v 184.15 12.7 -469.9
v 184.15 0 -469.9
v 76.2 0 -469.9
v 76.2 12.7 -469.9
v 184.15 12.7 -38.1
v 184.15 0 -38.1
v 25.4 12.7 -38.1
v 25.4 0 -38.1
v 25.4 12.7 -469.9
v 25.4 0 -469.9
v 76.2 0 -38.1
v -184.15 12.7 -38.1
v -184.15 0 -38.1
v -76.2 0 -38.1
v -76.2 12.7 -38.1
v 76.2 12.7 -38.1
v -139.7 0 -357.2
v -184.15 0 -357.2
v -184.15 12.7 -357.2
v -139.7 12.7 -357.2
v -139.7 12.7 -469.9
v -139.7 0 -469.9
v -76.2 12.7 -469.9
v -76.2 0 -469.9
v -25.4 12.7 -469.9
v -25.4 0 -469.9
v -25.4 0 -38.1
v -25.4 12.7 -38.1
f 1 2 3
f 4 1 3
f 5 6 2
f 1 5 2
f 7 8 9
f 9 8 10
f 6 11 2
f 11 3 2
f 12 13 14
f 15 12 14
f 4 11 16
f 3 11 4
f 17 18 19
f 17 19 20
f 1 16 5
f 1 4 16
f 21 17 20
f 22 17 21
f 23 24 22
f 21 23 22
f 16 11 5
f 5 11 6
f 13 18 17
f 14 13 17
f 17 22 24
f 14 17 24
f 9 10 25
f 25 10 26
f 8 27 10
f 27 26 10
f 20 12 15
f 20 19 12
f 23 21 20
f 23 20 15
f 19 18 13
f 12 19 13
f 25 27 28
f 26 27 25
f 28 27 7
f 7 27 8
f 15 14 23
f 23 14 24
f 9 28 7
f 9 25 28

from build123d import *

# Parameters (mm, degrees)
EXTRUDE2_DEPTH          = 12.7
SKETCH3_W               = 463.121935294
SKETCH3_H               = 86.735895098
CUT_EXTRUDE1_DEPTH      = 505.854951942
CUT_EXTRUDE2_DEPTH      = 505.854951942
SKETCH5_W               = 50.8
SKETCH5_H               = 476.704079848
CUT_EXTRUDE3_DEPTH      = 505.854951942
CUT_EXTRUDE4_DEPTH      = 505.854951942
CUT_EXTRUDE4_DEPTH_BACK = 505.854951942


with BuildPart() as part:
    # Sketch2 → Extrude2 (new body)
    with BuildSketch(Plane(origin=(0, 0, 0), x_dir=(1, 0, 0), z_dir=(0, 1, 0))):
        with BuildLine():
            Line((180.975, 469.9), (-180.975, 469.9))
            Line((-180.975, 469.9), (-184.15, 469.9))
            Line((-184.15, 469.9), (-184.15, 466.725))
            Line((-184.15, 466.725), (-184.15, 15.875))
            ThreePointArc((-184.15, 15.875), (-183.22006403, 13.62993597), (-180.975, 12.7))
            Line((-180.975, 12.7), (180.975, 12.7))
            ThreePointArc((180.975, 12.7), (183.22006403, 13.62993597), (184.15, 15.875))
            Line((184.15, 15.875), (184.15, 466.725))
            Line((184.15, 466.725), (184.15, 469.9))
            Line((184.15, 469.9), (180.975, 469.9))
        make_face()
    extrude(amount=EXTRUDE2_DEPTH)

    # Sketch3 → Cut-Extrude1 (cut, through all)
    with BuildSketch(Plane(origin=(0, 0, 0), x_dir=(1, 0, 0), z_dir=(0, 1, 0))):
        with Locations((0, -5.267947549)):
            Rectangle(SKETCH3_W, SKETCH3_H)
    extrude(amount=CUT_EXTRUDE1_DEPTH, mode=Mode.SUBTRACT)

    # Sketch4 → Cut-Extrude2 (cut, through all)
    with BuildSketch(Plane(origin=(0, 0, 0), x_dir=(1, 0, 0), z_dir=(0, 1, 0))):
        with BuildLine():
            Line((-165.1, 408.0002), (-203.365160902, 408.0002))
            Line((-203.365160902, 408.0002), (-203.365160902, 357.2002))
            Line((-203.365160902, 357.2002), (-165.1, 357.2002))
            ThreePointArc((-165.1, 357.2002), (-139.7, 382.6002), (-165.1, 408.0002))
        make_face()
    extrude(amount=CUT_EXTRUDE2_DEPTH, mode=Mode.SUBTRACT)

    # Sketch5 → Cut-Extrude3 (cut, through all)
    with BuildSketch(Plane(origin=(0, 0, 0), x_dir=(1, 0, 0), z_dir=(0, 1, 0))):
        with Locations((-50.8, 248.428767098)):
            Rectangle(SKETCH5_W, SKETCH5_H)
        with Locations((50.8, 248.428767098)):
            Rectangle(SKETCH5_W, SKETCH5_H)
    extrude(amount=CUT_EXTRUDE3_DEPTH, mode=Mode.SUBTRACT)


with BuildPart() as cut_extrude3_piece_1:
    # of the separate pieces the step leaves, piece 1, a body of its own (cut_extrude3_pieces)
    add(part.part.solids().sort_by_distance((184.15, 0, -469.9))[0])


with BuildPart() as cut_extrude3_piece_2:
    # of the separate pieces the step leaves, piece 2, a body of its own (cut_extrude3_pieces)
    add(part.part.solids().sort_by_distance((-76.2, 0, -469.9))[0])

    # Sketch6 → Cut-Extrude4 (cut, two sides: drawn at the far end of the back side and taken through both)
    with BuildSketch(Plane(origin=(0, 12.7, 0), x_dir=(-1, 0, 0), z_dir=(0, 1, 0)).offset(-CUT_EXTRUDE4_DEPTH_BACK)):
        Polygon((1273.65, -357.2002), (184.15, -357.2002), (139.7, -357.2002), (139.7, -469.9), (139.7, -1559.4), (1724.822887689, -3054.534251806), (2858.772887689, -1852.334451806), align=None)
    extrude(amount=CUT_EXTRUDE4_DEPTH + CUT_EXTRUDE4_DEPTH_BACK, mode=Mode.SUBTRACT)


with BuildPart() as cut_extrude3_piece_3:
    # of the separate pieces the step leaves, piece 3, a body of its own (cut_extrude3_pieces)
    add(part.part.solids().sort_by_distance((25.4, 0, -469.9))[0])


solid = Compound([cut_extrude3_piece_1.part, cut_extrude3_piece_2.part, cut_extrude3_piece_3.part])
